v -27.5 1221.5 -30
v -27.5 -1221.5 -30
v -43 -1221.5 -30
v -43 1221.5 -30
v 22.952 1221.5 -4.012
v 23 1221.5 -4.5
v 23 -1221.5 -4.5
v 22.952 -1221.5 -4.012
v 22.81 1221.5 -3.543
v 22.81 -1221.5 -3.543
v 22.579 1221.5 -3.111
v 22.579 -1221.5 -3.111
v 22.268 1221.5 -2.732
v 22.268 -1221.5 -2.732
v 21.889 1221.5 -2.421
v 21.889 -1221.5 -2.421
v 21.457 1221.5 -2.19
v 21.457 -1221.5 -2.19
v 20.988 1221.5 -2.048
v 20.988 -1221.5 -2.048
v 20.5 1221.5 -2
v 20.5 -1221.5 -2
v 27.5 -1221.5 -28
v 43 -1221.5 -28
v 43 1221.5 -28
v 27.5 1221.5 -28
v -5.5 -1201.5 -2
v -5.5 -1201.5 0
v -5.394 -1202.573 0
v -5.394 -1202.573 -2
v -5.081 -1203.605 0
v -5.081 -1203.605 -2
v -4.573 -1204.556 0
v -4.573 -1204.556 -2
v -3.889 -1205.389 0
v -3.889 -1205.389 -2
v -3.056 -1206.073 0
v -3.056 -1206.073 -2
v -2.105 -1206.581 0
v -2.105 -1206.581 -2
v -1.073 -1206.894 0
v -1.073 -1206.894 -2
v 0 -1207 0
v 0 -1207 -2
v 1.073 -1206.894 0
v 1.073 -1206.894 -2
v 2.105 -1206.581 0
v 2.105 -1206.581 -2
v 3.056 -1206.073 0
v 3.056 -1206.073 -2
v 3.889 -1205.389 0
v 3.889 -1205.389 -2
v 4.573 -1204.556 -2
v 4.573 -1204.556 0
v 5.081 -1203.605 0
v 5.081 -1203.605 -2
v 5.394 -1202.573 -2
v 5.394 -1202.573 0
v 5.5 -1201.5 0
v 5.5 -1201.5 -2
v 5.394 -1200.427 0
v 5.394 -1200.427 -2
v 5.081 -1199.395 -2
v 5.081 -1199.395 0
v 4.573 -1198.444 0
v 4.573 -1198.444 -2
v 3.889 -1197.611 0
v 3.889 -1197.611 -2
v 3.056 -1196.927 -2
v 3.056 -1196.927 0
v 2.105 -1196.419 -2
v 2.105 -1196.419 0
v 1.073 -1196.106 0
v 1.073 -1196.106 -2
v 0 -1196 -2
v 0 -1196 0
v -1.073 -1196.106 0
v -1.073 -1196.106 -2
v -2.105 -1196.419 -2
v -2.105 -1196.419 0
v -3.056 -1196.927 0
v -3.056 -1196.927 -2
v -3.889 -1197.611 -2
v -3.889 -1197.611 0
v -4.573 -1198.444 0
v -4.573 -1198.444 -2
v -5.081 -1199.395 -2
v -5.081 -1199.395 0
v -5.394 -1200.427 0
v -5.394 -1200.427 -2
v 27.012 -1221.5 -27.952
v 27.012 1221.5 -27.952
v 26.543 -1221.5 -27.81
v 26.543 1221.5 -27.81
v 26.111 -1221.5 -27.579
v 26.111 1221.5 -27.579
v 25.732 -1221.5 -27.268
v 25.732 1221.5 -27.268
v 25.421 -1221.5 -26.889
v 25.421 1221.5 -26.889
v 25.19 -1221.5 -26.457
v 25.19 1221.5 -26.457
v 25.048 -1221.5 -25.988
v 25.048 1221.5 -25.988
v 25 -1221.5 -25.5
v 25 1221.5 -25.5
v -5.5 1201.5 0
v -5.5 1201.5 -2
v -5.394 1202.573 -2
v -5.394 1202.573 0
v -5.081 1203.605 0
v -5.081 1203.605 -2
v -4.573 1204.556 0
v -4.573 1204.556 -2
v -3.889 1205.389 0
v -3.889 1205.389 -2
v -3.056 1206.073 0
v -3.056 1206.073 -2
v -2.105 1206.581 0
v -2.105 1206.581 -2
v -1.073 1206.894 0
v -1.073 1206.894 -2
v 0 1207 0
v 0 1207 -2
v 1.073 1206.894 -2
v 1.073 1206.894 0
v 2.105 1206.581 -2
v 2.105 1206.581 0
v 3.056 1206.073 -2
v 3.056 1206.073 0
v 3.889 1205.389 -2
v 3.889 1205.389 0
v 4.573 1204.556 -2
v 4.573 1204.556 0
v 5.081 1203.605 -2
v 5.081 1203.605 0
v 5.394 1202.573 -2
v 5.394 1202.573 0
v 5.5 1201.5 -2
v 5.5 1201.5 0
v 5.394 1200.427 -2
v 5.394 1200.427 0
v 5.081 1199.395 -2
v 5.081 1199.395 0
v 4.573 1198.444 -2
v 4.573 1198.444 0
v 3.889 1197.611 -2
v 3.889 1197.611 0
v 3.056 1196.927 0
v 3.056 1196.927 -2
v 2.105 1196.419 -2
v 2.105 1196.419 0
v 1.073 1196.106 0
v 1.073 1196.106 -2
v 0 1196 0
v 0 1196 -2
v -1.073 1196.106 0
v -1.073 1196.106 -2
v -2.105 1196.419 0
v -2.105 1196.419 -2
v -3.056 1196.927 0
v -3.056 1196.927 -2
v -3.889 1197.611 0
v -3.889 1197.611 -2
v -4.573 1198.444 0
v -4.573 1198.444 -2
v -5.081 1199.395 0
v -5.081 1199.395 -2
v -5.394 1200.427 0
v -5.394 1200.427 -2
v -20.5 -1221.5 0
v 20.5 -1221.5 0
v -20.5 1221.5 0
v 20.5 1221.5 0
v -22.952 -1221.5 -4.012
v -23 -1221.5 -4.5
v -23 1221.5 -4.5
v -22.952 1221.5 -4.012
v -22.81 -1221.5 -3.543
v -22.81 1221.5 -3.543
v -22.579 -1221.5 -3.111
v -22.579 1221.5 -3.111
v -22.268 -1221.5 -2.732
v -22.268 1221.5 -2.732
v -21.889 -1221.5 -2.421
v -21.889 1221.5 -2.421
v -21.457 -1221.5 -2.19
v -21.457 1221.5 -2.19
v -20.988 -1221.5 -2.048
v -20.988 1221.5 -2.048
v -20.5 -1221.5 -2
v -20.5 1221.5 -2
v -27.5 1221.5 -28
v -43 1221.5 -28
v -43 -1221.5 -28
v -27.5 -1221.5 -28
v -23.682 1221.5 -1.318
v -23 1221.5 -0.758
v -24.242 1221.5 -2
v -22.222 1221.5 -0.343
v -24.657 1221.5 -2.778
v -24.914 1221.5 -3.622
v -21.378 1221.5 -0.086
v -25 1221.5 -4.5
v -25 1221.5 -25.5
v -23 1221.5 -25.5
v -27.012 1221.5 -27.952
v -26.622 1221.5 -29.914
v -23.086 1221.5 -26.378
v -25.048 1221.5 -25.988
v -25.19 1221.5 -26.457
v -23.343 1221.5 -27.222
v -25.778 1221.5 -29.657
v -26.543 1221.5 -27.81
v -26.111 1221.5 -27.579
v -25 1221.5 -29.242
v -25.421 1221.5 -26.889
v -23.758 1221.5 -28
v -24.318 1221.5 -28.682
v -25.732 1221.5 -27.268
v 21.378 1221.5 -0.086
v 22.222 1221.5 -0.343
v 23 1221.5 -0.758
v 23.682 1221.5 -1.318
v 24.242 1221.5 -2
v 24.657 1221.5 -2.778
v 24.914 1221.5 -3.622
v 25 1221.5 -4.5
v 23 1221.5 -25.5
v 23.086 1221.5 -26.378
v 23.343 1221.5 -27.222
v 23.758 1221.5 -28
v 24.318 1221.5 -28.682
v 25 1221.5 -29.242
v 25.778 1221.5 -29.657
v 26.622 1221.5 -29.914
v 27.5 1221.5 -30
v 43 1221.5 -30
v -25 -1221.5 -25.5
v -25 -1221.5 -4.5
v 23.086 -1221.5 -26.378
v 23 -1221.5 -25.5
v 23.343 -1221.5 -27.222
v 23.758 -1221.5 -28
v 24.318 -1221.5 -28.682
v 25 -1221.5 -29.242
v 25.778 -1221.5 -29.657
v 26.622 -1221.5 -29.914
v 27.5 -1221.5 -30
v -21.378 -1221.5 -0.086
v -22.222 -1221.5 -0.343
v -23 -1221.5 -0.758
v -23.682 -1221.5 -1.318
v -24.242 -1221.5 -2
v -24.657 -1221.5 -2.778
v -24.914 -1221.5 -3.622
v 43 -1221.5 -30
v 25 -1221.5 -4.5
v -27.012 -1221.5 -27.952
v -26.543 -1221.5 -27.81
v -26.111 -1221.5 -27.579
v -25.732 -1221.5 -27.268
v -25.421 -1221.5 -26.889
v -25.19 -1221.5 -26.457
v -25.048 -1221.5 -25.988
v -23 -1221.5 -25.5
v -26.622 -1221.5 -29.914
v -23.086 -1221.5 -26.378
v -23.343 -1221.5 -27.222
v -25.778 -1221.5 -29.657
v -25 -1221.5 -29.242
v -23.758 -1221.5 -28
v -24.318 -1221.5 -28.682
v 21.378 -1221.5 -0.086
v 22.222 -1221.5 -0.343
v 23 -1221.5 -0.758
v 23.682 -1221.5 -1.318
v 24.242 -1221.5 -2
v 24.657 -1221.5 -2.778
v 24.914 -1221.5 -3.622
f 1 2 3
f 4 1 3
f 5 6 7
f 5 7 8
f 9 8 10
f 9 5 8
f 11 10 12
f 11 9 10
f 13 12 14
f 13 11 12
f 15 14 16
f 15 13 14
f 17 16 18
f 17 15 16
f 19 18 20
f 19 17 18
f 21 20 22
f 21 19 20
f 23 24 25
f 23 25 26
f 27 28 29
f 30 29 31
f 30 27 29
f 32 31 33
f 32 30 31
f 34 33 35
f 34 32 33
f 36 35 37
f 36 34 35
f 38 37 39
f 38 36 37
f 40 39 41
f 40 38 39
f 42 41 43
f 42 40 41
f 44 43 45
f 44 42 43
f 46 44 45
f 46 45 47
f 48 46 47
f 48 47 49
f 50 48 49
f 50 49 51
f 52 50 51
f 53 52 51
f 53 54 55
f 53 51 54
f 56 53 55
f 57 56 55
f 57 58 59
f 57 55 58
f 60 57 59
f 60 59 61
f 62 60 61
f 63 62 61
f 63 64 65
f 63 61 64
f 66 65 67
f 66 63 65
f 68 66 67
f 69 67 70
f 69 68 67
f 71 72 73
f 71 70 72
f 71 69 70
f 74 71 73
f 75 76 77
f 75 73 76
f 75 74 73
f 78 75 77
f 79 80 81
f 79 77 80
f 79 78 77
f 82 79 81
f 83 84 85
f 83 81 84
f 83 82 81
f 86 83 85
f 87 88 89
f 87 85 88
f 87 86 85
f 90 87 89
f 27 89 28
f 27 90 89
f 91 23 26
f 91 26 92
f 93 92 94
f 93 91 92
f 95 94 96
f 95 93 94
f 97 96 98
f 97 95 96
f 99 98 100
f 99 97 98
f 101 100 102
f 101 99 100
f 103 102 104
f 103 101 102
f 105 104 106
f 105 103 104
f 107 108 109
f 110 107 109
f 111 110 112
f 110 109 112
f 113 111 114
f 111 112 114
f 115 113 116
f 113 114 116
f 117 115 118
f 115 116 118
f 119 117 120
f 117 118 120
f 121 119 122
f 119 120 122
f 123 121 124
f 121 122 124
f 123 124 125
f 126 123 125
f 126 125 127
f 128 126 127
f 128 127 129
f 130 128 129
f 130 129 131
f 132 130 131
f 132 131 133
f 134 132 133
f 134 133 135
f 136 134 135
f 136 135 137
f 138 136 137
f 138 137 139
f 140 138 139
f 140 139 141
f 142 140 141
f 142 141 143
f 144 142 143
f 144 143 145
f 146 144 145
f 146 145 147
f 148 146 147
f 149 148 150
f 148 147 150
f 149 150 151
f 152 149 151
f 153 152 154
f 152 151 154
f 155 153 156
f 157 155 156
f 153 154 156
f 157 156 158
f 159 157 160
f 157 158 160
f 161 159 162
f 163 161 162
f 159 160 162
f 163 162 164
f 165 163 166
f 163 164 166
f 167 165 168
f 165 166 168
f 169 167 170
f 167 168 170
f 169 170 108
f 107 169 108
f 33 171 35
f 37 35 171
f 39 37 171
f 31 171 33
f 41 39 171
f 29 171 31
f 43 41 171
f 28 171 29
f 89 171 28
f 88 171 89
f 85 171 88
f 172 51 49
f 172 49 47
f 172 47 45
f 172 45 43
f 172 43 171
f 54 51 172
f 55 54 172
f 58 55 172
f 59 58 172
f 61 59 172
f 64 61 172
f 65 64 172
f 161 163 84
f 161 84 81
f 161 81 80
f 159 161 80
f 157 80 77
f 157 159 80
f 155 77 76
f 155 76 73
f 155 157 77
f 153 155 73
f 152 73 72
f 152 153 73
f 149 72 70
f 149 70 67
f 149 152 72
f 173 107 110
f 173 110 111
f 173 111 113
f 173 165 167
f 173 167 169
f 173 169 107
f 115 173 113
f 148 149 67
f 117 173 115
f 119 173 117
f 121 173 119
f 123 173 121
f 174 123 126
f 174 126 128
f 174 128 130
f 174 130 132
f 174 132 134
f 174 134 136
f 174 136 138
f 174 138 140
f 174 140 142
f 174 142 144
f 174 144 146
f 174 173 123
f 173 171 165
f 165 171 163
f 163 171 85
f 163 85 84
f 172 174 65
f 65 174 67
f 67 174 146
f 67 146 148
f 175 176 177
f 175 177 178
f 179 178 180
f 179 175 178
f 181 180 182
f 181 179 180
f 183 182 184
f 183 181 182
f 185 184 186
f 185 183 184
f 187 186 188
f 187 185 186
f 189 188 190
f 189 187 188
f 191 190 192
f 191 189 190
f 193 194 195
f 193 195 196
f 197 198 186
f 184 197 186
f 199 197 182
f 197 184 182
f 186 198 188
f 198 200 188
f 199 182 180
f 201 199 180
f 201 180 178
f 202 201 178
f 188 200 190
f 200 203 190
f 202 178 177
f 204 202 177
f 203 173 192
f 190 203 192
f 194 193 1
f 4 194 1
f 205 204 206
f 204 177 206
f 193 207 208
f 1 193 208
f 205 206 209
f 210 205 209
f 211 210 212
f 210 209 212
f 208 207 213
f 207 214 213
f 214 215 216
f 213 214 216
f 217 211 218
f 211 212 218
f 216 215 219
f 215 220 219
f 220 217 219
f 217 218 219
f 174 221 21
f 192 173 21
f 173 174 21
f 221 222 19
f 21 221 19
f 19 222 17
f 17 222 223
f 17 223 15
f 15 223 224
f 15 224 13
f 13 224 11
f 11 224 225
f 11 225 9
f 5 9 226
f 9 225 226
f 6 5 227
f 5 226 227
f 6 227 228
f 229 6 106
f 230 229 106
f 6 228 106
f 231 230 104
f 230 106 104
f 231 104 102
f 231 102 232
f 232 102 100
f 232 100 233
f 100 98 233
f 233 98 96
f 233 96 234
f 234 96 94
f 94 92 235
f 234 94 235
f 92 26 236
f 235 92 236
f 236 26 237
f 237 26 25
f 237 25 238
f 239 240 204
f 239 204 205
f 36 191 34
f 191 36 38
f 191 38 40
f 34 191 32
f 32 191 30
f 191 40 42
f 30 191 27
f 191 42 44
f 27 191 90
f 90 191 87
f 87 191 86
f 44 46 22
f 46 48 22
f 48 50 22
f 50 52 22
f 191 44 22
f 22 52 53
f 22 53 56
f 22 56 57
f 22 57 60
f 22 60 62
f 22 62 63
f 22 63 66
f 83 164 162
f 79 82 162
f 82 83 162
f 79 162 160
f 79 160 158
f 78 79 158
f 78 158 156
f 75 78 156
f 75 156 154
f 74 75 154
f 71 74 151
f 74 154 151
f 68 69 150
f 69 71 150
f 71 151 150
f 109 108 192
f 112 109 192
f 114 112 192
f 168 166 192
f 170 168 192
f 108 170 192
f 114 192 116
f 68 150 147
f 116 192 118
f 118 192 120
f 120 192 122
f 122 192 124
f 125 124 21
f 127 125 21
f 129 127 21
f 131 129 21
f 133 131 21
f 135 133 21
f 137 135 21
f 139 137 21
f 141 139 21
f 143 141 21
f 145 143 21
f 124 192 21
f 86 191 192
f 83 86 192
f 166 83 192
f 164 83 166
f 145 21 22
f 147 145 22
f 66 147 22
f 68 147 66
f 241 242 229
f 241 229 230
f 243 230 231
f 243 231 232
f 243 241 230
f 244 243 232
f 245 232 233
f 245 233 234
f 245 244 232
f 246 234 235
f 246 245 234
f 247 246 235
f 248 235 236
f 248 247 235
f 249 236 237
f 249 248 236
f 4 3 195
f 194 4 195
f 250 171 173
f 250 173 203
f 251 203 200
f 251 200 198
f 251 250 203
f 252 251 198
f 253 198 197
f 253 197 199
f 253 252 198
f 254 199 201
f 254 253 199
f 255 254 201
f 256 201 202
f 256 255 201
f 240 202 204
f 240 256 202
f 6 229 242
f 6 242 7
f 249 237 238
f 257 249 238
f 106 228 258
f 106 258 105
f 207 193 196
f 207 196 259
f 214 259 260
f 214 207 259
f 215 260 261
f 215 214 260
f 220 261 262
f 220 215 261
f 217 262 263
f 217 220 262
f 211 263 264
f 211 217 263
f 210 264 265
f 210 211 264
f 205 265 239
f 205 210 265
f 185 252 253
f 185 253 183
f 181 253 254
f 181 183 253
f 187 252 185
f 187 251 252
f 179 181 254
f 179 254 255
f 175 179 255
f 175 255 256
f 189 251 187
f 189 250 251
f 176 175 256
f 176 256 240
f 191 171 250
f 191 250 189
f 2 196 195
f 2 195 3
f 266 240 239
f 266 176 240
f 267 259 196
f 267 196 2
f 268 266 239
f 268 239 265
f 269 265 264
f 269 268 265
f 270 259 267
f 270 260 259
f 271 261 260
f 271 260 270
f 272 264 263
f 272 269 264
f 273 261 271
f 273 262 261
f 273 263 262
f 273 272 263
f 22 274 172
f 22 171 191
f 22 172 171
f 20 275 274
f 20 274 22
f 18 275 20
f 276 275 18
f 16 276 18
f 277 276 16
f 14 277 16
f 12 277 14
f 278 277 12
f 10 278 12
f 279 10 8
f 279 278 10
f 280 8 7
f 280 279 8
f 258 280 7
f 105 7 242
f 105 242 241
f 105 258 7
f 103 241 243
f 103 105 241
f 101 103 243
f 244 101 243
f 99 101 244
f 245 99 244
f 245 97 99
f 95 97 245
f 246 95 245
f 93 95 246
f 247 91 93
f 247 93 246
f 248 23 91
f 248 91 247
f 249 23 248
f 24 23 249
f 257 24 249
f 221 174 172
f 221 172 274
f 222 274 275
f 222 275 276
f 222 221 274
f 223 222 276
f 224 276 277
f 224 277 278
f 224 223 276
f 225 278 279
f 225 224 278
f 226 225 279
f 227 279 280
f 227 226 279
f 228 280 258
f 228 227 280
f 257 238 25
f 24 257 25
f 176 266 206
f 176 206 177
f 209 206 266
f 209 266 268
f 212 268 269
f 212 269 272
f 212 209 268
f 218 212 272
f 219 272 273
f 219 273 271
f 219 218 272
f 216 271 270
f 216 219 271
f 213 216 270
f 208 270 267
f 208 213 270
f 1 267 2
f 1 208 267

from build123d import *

# Parameters (mm, degrees)
SKETCH1_W                      = 50
SKETCH1_H                      = 2443
BASE_FLANGE1_DEPTH             = 2
EDGE_FLANGE1_STRIP_W           = 13
EDGE_FLANGE1_STRIP_H           = 2
EDGE_FLANGE1_STRIP_CUT_DEPTH   = 2443
EDGE_FLANGE1_STRIP_2_W         = 13
EDGE_FLANGE1_STRIP_2_H         = 2
EDGE_FLANGE1_STRIP_CUT_2_DEPTH = 2443
EDGE_FLANGE1_DEPTH             = 2443
EDGE_FLANGE1_BEND_DEPTH        = 2443
EDGE_FLANGE2_STRIP_W           = 13
EDGE_FLANGE2_STRIP_H           = 2
EDGE_FLANGE2_STRIP_CUT_DEPTH   = 2443
EDGE_FLANGE2_STRIP_2_W         = 13
EDGE_FLANGE2_STRIP_2_H         = 2
EDGE_FLANGE2_STRIP_CUT_2_DEPTH = 2443
EDGE_FLANGE2_DEPTH             = 2443
EDGE_FLANGE2_BEND_DEPTH        = 2443
SKETCH18_R                     = 5.5
CUT_EXTRUDE1_DEPTH             = 10


# Sheet-metal steps are written as plain solids
with BuildPart() as part:
    # Sketch1 → Base-Flange1 (new body)
    with BuildSketch(Plane.XY):
        Rectangle(SKETCH1_W, SKETCH1_H)
    extrude(amount=-BASE_FLANGE1_DEPTH)

    # Edge-Flange1 strip (across the edge) → Edge-Flange1 strip cut (cut)
    with BuildSketch(Plane(origin=(25, 1221.5, -2), x_dir=(-1, 0, 0), z_dir=(0, -1, 0))):
        with Locations((-2, -1)):
            Rectangle(EDGE_FLANGE1_STRIP_W, EDGE_FLANGE1_STRIP_H)
    extrude(amount=EDGE_FLANGE1_STRIP_CUT_DEPTH, mode=Mode.SUBTRACT)

    # Edge-Flange1 strip 2 (across the edge) → Edge-Flange1 strip cut 2 (cut)
    with BuildSketch(Plane(origin=(-25, -1221.5, -2), x_dir=(1, 0, 0), z_dir=(0, 1, 0))):
        with Locations((-2, -1)):
            Rectangle(EDGE_FLANGE1_STRIP_2_W, EDGE_FLANGE1_STRIP_2_H)
    extrude(amount=EDGE_FLANGE1_STRIP_CUT_2_DEPTH, mode=Mode.SUBTRACT)

    # Edge-Flange1 section (across the edge) → Edge-Flange1 (add)
    with BuildSketch(Plane(origin=(25, 1221.5, -2), x_dir=(-1, 0, 0), z_dir=(0, -1, 0))):
        with BuildLine():
            Line((0, 2.5), (0, 28))
            Line((0, 28), (2, 28))
            Line((2, 28), (2, 2.5))
            ThreePointArc((2, 2.5), (2.732233047, 0.732233047), (4.5, 0))
            Line((4.5, 0), (4.5, -2))
            ThreePointArc((4.5, -2), (1.318019485, -0.681980515), (0, 2.5))
        make_face()
    extrude(amount=EDGE_FLANGE1_DEPTH)

    # Edge-Flange1 section 2 (across the edge) → Edge-Flange1 bend (add)
    with BuildSketch(Plane(origin=(-25, -1221.5, -2), x_dir=(1, 0, 0), z_dir=(0, 1, 0))):
        with BuildLine():
            Line((0, 2.5), (0, 28))
            Line((0, 28), (2, 28))
            Line((2, 28), (2, 2.5))
            ThreePointArc((2, 2.5), (2.732233047, 0.732233047), (4.5, 0))
            Line((4.5, 0), (4.5, -2))
            ThreePointArc((4.5, -2), (1.318019485, -0.681980515), (0, 2.5))
        make_face()
    extrude(amount=EDGE_FLANGE1_BEND_DEPTH)

    # Edge-Flange2 strip (across the edge) → Edge-Flange2 strip cut (cut)
    with BuildSketch(Plane(origin=(-25, 1221.5, -30), x_dir=(0, 0, 1), z_dir=(0, -1, 0))):
        with Locations((-2, -1)):
            Rectangle(EDGE_FLANGE2_STRIP_W, EDGE_FLANGE2_STRIP_H)
    extrude(amount=EDGE_FLANGE2_STRIP_CUT_DEPTH, mode=Mode.SUBTRACT)

    # Edge-Flange2 strip 2 (across the edge) → Edge-Flange2 strip cut 2 (cut)
    with BuildSketch(Plane(origin=(25, -1221.5, -30), x_dir=(0, 0, 1), z_dir=(0, 1, 0))):
        with Locations((-2, -1)):
            Rectangle(EDGE_FLANGE2_STRIP_2_W, EDGE_FLANGE2_STRIP_2_H)
    extrude(amount=EDGE_FLANGE2_STRIP_CUT_2_DEPTH, mode=Mode.SUBTRACT)

    # Edge-Flange2 section (across the edge) → Edge-Flange2 (add)
    with BuildSketch(Plane(origin=(-25, 1221.5, -30), x_dir=(0, 0, 1), z_dir=(0, -1, 0))):
        with BuildLine():
            Line((0, 2.5), (0, 18))
            Line((0, 18), (2, 18))
            Line((2, 18), (2, 2.5))
            ThreePointArc((2, 2.5), (2.732233047, 0.732233047), (4.5, 0))
            Line((4.5, 0), (4.5, -2))
            ThreePointArc((4.5, -2), (1.318019485, -0.681980515), (0, 2.5))
        make_face()
    extrude(amount=EDGE_FLANGE2_DEPTH)

    # Edge-Flange2 section 2 (across the edge) → Edge-Flange2 bend (add)
    with BuildSketch(Plane(origin=(25, -1221.5, -30), x_dir=(0, 0, 1), z_dir=(0, 1, 0))):
        with BuildLine():
            Line((0, 2.5), (0, 18))
            Line((0, 18), (2, 18))
            Line((2, 18), (2, 2.5))
            ThreePointArc((2, 2.5), (2.732233047, 0.732233047), (4.5, 0))
            Line((4.5, 0), (4.5, -2))
            ThreePointArc((4.5, -2), (1.318019485, -0.681980515), (0, 2.5))
        make_face()
    extrude(amount=EDGE_FLANGE2_BEND_DEPTH)

    # Sketch18 → Cut-Extrude1 (cut)
    with BuildSketch(Plane(origin=(0, 0, -2), x_dir=(-1, 0, 0), z_dir=(0, 0, -1))):
        with Locations((0, 1201.5)):
            Circle(SKETCH18_R)
    cut_extrude1 = extrude(amount=-CUT_EXTRUDE1_DEPTH, mode=Mode.SUBTRACT)

    # Mirror1: Cut-Extrude1 across plane
    add(cut_extrude1.mirror(Plane.ZX), mode=Mode.SUBTRACT)


solid = part.part
